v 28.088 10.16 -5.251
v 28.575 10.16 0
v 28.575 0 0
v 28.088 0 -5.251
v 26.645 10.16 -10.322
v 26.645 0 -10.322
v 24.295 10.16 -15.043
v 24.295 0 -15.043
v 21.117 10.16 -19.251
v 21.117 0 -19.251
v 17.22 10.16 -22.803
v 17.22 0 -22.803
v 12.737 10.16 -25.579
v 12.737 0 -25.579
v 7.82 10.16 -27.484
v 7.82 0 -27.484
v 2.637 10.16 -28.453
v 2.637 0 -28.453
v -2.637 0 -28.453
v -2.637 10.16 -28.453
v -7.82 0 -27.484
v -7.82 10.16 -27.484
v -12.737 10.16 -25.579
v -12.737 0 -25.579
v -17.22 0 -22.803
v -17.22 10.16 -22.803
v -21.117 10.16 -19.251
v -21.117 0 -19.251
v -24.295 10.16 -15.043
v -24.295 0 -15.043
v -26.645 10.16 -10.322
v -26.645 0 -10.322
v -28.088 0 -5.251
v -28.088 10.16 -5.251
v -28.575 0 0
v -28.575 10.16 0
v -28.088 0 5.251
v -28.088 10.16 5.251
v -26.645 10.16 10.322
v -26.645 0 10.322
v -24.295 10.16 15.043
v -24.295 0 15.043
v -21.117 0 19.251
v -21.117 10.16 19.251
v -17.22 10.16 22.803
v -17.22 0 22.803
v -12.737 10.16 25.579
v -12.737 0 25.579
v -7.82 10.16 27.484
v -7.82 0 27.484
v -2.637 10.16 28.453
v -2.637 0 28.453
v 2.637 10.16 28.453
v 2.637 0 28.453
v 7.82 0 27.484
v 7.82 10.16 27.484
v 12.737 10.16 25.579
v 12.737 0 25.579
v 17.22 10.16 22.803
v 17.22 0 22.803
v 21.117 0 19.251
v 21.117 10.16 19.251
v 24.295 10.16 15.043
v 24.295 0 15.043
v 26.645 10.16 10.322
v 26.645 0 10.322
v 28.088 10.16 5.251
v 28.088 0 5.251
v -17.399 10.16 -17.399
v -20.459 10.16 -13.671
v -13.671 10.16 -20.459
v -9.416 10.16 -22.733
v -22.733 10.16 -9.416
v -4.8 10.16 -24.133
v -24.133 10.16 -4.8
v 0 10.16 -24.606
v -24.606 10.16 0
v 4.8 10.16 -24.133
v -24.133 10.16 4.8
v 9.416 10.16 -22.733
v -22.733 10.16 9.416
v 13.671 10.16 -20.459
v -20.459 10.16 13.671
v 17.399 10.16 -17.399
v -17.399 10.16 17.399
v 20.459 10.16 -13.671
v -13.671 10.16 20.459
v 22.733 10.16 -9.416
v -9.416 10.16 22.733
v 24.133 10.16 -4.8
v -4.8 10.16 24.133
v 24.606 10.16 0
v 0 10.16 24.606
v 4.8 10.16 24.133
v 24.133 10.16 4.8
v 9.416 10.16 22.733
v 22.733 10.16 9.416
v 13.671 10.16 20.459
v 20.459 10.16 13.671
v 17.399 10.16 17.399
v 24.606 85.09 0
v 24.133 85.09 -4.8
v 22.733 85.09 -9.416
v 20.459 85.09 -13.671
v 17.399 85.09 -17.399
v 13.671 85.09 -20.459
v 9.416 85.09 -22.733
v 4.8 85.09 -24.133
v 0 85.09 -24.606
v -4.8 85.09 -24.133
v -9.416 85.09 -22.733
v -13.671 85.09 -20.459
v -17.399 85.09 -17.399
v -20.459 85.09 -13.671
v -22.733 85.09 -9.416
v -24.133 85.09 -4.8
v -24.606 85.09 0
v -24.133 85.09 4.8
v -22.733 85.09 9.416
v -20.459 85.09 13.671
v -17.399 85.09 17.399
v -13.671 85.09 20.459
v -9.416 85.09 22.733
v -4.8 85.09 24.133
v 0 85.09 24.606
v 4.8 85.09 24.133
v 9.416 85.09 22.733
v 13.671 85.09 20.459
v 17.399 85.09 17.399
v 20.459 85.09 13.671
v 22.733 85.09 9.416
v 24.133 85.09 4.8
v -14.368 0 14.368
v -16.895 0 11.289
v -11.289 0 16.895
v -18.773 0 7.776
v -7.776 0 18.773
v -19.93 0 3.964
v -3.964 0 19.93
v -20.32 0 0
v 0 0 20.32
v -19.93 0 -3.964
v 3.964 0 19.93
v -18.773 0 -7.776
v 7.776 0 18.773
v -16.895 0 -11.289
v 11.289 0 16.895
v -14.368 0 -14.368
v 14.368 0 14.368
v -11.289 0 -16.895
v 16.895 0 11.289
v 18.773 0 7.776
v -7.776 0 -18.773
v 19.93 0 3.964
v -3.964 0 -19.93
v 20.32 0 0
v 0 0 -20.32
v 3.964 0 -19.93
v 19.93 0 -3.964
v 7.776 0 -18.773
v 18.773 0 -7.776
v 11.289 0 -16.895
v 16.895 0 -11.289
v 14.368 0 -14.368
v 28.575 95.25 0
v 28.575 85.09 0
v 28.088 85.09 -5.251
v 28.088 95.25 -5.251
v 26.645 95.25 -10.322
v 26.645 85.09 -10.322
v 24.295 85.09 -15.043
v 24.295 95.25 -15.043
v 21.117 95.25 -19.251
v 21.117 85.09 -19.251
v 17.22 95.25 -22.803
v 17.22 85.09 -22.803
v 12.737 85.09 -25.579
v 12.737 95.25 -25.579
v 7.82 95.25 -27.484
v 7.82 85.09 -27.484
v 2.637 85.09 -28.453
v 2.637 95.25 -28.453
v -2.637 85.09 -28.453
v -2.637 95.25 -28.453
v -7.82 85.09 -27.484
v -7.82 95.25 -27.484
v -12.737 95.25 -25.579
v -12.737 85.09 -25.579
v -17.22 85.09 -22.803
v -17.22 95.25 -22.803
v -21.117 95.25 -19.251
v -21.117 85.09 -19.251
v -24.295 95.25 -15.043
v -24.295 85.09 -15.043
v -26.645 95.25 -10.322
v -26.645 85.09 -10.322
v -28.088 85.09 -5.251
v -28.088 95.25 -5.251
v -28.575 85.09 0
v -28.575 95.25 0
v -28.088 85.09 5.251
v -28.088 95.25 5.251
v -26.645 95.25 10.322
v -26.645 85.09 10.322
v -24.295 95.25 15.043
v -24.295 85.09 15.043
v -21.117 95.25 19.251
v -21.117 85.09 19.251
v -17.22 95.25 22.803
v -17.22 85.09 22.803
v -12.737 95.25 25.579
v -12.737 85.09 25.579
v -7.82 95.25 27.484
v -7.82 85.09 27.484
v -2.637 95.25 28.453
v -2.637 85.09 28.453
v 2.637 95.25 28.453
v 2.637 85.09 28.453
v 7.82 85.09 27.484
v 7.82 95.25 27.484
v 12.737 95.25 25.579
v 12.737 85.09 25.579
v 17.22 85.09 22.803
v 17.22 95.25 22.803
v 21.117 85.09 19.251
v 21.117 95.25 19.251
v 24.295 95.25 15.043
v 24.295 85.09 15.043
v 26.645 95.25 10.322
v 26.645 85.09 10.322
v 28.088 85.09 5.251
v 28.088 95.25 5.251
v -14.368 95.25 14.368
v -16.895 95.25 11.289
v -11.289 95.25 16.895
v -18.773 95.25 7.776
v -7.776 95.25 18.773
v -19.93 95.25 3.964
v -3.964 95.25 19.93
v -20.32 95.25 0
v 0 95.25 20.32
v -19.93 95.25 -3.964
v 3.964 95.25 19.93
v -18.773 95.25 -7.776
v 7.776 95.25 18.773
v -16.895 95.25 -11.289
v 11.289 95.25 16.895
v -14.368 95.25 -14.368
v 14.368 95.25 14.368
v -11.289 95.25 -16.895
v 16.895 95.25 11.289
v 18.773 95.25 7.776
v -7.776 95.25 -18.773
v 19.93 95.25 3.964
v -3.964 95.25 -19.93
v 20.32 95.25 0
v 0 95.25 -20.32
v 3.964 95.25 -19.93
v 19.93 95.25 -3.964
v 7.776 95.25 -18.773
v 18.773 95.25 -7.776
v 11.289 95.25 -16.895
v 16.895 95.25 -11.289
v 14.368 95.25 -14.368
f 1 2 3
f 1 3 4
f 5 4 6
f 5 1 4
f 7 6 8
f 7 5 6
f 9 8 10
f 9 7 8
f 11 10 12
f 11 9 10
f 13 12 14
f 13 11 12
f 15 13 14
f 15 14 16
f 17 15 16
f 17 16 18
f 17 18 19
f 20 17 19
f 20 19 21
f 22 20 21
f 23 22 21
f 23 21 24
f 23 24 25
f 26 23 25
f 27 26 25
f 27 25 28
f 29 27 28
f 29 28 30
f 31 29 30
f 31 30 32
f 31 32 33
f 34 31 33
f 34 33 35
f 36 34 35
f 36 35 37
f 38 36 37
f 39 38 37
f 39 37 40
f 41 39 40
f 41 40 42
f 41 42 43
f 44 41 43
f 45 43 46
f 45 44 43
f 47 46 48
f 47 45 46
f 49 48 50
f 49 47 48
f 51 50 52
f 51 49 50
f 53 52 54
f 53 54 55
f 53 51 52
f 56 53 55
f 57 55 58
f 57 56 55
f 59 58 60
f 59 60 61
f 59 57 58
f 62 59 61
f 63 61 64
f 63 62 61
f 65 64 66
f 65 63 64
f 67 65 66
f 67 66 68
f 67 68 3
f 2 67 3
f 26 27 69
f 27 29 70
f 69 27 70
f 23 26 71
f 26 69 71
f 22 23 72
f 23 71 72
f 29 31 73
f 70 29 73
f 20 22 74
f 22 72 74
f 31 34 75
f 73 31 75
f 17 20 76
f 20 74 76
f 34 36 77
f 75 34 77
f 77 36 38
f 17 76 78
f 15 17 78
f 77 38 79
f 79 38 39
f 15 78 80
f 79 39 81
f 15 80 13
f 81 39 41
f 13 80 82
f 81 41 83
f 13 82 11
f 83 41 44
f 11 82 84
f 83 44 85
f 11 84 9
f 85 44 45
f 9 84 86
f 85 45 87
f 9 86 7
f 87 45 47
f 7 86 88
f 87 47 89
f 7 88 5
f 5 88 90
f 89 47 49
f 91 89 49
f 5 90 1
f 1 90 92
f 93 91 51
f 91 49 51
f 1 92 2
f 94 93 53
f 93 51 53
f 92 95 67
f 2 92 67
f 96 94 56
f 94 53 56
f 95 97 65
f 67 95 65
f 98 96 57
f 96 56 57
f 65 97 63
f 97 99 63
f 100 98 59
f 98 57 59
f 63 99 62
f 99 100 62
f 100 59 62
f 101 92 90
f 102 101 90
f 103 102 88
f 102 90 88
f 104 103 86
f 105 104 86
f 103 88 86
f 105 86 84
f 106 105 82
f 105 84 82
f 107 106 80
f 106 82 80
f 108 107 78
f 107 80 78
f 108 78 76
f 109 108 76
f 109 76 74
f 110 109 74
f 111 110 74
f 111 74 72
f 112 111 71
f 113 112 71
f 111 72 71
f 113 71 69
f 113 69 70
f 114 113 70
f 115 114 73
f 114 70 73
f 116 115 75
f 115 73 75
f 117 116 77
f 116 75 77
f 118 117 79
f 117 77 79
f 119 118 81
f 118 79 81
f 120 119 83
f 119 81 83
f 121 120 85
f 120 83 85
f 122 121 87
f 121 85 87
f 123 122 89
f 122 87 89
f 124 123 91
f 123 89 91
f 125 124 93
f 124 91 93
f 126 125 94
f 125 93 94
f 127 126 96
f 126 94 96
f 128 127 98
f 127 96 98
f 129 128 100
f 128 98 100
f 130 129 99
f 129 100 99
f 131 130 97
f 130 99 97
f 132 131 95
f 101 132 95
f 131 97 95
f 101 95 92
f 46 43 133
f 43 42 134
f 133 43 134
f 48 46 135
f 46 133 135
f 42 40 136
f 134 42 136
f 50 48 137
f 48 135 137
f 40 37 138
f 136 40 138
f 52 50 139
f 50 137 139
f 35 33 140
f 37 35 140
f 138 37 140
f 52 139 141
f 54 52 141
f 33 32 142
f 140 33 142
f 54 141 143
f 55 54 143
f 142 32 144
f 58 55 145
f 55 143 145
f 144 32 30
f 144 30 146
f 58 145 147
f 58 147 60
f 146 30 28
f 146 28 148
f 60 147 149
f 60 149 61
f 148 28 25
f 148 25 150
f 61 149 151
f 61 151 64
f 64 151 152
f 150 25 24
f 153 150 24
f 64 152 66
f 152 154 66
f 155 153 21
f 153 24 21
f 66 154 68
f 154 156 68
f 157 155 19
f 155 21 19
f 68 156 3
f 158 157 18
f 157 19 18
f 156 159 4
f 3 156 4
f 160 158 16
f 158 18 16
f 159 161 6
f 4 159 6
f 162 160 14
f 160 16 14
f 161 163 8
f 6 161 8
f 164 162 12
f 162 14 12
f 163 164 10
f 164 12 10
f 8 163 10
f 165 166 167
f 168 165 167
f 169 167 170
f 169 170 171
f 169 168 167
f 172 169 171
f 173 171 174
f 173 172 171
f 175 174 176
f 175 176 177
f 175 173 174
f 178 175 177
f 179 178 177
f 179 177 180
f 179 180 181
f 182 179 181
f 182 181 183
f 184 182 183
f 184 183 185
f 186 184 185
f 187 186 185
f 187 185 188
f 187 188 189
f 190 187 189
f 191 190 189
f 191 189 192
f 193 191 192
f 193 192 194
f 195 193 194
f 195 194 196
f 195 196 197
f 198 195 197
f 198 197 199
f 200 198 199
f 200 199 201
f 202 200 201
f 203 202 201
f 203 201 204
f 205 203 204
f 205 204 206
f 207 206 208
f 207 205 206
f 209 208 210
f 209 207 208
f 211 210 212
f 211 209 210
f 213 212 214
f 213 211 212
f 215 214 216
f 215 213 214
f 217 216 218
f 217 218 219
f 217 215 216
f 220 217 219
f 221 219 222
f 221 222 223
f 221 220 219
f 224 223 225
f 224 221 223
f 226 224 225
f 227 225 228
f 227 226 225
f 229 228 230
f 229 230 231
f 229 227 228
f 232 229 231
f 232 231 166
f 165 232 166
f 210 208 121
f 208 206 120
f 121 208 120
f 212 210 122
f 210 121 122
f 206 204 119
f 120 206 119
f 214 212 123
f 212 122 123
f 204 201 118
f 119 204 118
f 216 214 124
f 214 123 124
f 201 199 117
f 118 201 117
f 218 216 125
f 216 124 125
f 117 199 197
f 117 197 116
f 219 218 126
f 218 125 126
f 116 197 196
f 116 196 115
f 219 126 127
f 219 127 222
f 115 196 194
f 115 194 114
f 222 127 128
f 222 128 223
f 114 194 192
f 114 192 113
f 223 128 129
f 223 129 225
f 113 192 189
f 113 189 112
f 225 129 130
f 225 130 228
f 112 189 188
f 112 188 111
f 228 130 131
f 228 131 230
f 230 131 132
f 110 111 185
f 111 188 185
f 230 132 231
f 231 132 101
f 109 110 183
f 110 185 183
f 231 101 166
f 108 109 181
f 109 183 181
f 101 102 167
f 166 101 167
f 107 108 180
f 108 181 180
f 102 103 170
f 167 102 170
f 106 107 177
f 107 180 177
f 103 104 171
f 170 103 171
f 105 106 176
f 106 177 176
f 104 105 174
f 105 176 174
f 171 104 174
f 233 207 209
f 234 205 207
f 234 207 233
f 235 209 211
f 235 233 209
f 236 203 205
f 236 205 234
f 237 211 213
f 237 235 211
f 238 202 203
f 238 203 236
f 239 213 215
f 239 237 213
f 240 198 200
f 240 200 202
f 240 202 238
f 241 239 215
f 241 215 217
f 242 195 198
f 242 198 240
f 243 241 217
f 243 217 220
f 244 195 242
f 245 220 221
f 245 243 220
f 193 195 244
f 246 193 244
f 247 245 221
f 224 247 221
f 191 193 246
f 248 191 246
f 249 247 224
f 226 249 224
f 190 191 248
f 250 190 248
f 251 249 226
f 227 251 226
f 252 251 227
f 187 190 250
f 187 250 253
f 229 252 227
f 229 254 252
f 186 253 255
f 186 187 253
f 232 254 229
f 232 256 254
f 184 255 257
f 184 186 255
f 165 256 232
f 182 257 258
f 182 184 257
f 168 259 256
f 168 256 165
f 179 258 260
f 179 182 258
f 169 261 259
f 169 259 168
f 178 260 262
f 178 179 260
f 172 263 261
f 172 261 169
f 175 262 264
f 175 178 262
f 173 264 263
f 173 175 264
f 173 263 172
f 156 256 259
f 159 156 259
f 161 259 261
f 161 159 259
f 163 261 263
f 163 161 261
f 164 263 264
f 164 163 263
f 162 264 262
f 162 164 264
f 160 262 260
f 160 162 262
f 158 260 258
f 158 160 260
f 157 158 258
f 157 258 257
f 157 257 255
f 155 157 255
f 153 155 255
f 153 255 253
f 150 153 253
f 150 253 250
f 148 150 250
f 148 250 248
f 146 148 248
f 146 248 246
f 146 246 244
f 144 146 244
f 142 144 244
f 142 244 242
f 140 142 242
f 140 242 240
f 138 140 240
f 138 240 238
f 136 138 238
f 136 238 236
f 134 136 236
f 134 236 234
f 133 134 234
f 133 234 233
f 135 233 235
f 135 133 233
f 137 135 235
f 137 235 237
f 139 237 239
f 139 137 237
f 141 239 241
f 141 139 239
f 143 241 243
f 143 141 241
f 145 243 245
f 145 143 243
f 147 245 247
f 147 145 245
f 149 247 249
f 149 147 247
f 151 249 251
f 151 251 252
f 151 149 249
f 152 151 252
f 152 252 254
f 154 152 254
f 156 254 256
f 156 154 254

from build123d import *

# Parameters (mm, degrees)
SKETCH1_R               = 24.60625
SKETCH1_R_2             = 20.32
BOSS_EXTRUDE1_DEPTH     = 95.25
SKETCH2_R               = 28.575
SKETCH2_R_2             = 24.60625
BOSS_EXTRUDE2_DEPTH     = 95.25
SKETCH3_W               = 57.15
SKETCH3_H               = 74.93
CUT_EXTRUDE1_DEPTH      = 29.575
CUT_EXTRUDE1_DEPTH_BACK = 29.575
SKETCH4_R               = 24.60625
SKETCH4_R_2             = 20.32
BOSS_EXTRUDE3_DEPTH     = 74.93


with BuildPart() as part:
    # Sketch1 → Boss-Extrude1 (new body)
    with BuildSketch(Plane(origin=(0, 0, 0), x_dir=(1, 0, 0), z_dir=(0, 1, 0))):
        Circle(SKETCH1_R)
        Circle(SKETCH1_R_2, mode=Mode.SUBTRACT)
    extrude(amount=BOSS_EXTRUDE1_DEPTH)

    # Sketch2 → Boss-Extrude2 (add)
    with BuildSketch(Plane(origin=(0, 95.25, 0), x_dir=(1, 0, 0), z_dir=(0, 1, 0))):
        Circle(SKETCH2_R)
        Circle(SKETCH2_R_2, mode=Mode.SUBTRACT)
    extrude(amount=-BOSS_EXTRUDE2_DEPTH)

    # Sketch3 → Cut-Extrude1 (cut, two sides)
    with BuildSketch(Plane.XY) as cut_extrude1_sk:
        with Locations((0, 47.625)):
            Rectangle(SKETCH3_W, SKETCH3_H)
    extrude(amount=CUT_EXTRUDE1_DEPTH, mode=Mode.SUBTRACT)
    extrude(cut_extrude1_sk.sketch, amount=-CUT_EXTRUDE1_DEPTH_BACK, mode=Mode.SUBTRACT)

    # Sketch4 → Boss-Extrude3 (add)
    with BuildSketch(Plane(origin=(0, 10.16, 0), x_dir=(1, 0, 0), z_dir=(0, 1, 0))):
        Circle(SKETCH4_R)
        Circle(SKETCH4_R_2, mode=Mode.SUBTRACT)
    extrude(amount=BOSS_EXTRUDE3_DEPTH)


solid = part.part
